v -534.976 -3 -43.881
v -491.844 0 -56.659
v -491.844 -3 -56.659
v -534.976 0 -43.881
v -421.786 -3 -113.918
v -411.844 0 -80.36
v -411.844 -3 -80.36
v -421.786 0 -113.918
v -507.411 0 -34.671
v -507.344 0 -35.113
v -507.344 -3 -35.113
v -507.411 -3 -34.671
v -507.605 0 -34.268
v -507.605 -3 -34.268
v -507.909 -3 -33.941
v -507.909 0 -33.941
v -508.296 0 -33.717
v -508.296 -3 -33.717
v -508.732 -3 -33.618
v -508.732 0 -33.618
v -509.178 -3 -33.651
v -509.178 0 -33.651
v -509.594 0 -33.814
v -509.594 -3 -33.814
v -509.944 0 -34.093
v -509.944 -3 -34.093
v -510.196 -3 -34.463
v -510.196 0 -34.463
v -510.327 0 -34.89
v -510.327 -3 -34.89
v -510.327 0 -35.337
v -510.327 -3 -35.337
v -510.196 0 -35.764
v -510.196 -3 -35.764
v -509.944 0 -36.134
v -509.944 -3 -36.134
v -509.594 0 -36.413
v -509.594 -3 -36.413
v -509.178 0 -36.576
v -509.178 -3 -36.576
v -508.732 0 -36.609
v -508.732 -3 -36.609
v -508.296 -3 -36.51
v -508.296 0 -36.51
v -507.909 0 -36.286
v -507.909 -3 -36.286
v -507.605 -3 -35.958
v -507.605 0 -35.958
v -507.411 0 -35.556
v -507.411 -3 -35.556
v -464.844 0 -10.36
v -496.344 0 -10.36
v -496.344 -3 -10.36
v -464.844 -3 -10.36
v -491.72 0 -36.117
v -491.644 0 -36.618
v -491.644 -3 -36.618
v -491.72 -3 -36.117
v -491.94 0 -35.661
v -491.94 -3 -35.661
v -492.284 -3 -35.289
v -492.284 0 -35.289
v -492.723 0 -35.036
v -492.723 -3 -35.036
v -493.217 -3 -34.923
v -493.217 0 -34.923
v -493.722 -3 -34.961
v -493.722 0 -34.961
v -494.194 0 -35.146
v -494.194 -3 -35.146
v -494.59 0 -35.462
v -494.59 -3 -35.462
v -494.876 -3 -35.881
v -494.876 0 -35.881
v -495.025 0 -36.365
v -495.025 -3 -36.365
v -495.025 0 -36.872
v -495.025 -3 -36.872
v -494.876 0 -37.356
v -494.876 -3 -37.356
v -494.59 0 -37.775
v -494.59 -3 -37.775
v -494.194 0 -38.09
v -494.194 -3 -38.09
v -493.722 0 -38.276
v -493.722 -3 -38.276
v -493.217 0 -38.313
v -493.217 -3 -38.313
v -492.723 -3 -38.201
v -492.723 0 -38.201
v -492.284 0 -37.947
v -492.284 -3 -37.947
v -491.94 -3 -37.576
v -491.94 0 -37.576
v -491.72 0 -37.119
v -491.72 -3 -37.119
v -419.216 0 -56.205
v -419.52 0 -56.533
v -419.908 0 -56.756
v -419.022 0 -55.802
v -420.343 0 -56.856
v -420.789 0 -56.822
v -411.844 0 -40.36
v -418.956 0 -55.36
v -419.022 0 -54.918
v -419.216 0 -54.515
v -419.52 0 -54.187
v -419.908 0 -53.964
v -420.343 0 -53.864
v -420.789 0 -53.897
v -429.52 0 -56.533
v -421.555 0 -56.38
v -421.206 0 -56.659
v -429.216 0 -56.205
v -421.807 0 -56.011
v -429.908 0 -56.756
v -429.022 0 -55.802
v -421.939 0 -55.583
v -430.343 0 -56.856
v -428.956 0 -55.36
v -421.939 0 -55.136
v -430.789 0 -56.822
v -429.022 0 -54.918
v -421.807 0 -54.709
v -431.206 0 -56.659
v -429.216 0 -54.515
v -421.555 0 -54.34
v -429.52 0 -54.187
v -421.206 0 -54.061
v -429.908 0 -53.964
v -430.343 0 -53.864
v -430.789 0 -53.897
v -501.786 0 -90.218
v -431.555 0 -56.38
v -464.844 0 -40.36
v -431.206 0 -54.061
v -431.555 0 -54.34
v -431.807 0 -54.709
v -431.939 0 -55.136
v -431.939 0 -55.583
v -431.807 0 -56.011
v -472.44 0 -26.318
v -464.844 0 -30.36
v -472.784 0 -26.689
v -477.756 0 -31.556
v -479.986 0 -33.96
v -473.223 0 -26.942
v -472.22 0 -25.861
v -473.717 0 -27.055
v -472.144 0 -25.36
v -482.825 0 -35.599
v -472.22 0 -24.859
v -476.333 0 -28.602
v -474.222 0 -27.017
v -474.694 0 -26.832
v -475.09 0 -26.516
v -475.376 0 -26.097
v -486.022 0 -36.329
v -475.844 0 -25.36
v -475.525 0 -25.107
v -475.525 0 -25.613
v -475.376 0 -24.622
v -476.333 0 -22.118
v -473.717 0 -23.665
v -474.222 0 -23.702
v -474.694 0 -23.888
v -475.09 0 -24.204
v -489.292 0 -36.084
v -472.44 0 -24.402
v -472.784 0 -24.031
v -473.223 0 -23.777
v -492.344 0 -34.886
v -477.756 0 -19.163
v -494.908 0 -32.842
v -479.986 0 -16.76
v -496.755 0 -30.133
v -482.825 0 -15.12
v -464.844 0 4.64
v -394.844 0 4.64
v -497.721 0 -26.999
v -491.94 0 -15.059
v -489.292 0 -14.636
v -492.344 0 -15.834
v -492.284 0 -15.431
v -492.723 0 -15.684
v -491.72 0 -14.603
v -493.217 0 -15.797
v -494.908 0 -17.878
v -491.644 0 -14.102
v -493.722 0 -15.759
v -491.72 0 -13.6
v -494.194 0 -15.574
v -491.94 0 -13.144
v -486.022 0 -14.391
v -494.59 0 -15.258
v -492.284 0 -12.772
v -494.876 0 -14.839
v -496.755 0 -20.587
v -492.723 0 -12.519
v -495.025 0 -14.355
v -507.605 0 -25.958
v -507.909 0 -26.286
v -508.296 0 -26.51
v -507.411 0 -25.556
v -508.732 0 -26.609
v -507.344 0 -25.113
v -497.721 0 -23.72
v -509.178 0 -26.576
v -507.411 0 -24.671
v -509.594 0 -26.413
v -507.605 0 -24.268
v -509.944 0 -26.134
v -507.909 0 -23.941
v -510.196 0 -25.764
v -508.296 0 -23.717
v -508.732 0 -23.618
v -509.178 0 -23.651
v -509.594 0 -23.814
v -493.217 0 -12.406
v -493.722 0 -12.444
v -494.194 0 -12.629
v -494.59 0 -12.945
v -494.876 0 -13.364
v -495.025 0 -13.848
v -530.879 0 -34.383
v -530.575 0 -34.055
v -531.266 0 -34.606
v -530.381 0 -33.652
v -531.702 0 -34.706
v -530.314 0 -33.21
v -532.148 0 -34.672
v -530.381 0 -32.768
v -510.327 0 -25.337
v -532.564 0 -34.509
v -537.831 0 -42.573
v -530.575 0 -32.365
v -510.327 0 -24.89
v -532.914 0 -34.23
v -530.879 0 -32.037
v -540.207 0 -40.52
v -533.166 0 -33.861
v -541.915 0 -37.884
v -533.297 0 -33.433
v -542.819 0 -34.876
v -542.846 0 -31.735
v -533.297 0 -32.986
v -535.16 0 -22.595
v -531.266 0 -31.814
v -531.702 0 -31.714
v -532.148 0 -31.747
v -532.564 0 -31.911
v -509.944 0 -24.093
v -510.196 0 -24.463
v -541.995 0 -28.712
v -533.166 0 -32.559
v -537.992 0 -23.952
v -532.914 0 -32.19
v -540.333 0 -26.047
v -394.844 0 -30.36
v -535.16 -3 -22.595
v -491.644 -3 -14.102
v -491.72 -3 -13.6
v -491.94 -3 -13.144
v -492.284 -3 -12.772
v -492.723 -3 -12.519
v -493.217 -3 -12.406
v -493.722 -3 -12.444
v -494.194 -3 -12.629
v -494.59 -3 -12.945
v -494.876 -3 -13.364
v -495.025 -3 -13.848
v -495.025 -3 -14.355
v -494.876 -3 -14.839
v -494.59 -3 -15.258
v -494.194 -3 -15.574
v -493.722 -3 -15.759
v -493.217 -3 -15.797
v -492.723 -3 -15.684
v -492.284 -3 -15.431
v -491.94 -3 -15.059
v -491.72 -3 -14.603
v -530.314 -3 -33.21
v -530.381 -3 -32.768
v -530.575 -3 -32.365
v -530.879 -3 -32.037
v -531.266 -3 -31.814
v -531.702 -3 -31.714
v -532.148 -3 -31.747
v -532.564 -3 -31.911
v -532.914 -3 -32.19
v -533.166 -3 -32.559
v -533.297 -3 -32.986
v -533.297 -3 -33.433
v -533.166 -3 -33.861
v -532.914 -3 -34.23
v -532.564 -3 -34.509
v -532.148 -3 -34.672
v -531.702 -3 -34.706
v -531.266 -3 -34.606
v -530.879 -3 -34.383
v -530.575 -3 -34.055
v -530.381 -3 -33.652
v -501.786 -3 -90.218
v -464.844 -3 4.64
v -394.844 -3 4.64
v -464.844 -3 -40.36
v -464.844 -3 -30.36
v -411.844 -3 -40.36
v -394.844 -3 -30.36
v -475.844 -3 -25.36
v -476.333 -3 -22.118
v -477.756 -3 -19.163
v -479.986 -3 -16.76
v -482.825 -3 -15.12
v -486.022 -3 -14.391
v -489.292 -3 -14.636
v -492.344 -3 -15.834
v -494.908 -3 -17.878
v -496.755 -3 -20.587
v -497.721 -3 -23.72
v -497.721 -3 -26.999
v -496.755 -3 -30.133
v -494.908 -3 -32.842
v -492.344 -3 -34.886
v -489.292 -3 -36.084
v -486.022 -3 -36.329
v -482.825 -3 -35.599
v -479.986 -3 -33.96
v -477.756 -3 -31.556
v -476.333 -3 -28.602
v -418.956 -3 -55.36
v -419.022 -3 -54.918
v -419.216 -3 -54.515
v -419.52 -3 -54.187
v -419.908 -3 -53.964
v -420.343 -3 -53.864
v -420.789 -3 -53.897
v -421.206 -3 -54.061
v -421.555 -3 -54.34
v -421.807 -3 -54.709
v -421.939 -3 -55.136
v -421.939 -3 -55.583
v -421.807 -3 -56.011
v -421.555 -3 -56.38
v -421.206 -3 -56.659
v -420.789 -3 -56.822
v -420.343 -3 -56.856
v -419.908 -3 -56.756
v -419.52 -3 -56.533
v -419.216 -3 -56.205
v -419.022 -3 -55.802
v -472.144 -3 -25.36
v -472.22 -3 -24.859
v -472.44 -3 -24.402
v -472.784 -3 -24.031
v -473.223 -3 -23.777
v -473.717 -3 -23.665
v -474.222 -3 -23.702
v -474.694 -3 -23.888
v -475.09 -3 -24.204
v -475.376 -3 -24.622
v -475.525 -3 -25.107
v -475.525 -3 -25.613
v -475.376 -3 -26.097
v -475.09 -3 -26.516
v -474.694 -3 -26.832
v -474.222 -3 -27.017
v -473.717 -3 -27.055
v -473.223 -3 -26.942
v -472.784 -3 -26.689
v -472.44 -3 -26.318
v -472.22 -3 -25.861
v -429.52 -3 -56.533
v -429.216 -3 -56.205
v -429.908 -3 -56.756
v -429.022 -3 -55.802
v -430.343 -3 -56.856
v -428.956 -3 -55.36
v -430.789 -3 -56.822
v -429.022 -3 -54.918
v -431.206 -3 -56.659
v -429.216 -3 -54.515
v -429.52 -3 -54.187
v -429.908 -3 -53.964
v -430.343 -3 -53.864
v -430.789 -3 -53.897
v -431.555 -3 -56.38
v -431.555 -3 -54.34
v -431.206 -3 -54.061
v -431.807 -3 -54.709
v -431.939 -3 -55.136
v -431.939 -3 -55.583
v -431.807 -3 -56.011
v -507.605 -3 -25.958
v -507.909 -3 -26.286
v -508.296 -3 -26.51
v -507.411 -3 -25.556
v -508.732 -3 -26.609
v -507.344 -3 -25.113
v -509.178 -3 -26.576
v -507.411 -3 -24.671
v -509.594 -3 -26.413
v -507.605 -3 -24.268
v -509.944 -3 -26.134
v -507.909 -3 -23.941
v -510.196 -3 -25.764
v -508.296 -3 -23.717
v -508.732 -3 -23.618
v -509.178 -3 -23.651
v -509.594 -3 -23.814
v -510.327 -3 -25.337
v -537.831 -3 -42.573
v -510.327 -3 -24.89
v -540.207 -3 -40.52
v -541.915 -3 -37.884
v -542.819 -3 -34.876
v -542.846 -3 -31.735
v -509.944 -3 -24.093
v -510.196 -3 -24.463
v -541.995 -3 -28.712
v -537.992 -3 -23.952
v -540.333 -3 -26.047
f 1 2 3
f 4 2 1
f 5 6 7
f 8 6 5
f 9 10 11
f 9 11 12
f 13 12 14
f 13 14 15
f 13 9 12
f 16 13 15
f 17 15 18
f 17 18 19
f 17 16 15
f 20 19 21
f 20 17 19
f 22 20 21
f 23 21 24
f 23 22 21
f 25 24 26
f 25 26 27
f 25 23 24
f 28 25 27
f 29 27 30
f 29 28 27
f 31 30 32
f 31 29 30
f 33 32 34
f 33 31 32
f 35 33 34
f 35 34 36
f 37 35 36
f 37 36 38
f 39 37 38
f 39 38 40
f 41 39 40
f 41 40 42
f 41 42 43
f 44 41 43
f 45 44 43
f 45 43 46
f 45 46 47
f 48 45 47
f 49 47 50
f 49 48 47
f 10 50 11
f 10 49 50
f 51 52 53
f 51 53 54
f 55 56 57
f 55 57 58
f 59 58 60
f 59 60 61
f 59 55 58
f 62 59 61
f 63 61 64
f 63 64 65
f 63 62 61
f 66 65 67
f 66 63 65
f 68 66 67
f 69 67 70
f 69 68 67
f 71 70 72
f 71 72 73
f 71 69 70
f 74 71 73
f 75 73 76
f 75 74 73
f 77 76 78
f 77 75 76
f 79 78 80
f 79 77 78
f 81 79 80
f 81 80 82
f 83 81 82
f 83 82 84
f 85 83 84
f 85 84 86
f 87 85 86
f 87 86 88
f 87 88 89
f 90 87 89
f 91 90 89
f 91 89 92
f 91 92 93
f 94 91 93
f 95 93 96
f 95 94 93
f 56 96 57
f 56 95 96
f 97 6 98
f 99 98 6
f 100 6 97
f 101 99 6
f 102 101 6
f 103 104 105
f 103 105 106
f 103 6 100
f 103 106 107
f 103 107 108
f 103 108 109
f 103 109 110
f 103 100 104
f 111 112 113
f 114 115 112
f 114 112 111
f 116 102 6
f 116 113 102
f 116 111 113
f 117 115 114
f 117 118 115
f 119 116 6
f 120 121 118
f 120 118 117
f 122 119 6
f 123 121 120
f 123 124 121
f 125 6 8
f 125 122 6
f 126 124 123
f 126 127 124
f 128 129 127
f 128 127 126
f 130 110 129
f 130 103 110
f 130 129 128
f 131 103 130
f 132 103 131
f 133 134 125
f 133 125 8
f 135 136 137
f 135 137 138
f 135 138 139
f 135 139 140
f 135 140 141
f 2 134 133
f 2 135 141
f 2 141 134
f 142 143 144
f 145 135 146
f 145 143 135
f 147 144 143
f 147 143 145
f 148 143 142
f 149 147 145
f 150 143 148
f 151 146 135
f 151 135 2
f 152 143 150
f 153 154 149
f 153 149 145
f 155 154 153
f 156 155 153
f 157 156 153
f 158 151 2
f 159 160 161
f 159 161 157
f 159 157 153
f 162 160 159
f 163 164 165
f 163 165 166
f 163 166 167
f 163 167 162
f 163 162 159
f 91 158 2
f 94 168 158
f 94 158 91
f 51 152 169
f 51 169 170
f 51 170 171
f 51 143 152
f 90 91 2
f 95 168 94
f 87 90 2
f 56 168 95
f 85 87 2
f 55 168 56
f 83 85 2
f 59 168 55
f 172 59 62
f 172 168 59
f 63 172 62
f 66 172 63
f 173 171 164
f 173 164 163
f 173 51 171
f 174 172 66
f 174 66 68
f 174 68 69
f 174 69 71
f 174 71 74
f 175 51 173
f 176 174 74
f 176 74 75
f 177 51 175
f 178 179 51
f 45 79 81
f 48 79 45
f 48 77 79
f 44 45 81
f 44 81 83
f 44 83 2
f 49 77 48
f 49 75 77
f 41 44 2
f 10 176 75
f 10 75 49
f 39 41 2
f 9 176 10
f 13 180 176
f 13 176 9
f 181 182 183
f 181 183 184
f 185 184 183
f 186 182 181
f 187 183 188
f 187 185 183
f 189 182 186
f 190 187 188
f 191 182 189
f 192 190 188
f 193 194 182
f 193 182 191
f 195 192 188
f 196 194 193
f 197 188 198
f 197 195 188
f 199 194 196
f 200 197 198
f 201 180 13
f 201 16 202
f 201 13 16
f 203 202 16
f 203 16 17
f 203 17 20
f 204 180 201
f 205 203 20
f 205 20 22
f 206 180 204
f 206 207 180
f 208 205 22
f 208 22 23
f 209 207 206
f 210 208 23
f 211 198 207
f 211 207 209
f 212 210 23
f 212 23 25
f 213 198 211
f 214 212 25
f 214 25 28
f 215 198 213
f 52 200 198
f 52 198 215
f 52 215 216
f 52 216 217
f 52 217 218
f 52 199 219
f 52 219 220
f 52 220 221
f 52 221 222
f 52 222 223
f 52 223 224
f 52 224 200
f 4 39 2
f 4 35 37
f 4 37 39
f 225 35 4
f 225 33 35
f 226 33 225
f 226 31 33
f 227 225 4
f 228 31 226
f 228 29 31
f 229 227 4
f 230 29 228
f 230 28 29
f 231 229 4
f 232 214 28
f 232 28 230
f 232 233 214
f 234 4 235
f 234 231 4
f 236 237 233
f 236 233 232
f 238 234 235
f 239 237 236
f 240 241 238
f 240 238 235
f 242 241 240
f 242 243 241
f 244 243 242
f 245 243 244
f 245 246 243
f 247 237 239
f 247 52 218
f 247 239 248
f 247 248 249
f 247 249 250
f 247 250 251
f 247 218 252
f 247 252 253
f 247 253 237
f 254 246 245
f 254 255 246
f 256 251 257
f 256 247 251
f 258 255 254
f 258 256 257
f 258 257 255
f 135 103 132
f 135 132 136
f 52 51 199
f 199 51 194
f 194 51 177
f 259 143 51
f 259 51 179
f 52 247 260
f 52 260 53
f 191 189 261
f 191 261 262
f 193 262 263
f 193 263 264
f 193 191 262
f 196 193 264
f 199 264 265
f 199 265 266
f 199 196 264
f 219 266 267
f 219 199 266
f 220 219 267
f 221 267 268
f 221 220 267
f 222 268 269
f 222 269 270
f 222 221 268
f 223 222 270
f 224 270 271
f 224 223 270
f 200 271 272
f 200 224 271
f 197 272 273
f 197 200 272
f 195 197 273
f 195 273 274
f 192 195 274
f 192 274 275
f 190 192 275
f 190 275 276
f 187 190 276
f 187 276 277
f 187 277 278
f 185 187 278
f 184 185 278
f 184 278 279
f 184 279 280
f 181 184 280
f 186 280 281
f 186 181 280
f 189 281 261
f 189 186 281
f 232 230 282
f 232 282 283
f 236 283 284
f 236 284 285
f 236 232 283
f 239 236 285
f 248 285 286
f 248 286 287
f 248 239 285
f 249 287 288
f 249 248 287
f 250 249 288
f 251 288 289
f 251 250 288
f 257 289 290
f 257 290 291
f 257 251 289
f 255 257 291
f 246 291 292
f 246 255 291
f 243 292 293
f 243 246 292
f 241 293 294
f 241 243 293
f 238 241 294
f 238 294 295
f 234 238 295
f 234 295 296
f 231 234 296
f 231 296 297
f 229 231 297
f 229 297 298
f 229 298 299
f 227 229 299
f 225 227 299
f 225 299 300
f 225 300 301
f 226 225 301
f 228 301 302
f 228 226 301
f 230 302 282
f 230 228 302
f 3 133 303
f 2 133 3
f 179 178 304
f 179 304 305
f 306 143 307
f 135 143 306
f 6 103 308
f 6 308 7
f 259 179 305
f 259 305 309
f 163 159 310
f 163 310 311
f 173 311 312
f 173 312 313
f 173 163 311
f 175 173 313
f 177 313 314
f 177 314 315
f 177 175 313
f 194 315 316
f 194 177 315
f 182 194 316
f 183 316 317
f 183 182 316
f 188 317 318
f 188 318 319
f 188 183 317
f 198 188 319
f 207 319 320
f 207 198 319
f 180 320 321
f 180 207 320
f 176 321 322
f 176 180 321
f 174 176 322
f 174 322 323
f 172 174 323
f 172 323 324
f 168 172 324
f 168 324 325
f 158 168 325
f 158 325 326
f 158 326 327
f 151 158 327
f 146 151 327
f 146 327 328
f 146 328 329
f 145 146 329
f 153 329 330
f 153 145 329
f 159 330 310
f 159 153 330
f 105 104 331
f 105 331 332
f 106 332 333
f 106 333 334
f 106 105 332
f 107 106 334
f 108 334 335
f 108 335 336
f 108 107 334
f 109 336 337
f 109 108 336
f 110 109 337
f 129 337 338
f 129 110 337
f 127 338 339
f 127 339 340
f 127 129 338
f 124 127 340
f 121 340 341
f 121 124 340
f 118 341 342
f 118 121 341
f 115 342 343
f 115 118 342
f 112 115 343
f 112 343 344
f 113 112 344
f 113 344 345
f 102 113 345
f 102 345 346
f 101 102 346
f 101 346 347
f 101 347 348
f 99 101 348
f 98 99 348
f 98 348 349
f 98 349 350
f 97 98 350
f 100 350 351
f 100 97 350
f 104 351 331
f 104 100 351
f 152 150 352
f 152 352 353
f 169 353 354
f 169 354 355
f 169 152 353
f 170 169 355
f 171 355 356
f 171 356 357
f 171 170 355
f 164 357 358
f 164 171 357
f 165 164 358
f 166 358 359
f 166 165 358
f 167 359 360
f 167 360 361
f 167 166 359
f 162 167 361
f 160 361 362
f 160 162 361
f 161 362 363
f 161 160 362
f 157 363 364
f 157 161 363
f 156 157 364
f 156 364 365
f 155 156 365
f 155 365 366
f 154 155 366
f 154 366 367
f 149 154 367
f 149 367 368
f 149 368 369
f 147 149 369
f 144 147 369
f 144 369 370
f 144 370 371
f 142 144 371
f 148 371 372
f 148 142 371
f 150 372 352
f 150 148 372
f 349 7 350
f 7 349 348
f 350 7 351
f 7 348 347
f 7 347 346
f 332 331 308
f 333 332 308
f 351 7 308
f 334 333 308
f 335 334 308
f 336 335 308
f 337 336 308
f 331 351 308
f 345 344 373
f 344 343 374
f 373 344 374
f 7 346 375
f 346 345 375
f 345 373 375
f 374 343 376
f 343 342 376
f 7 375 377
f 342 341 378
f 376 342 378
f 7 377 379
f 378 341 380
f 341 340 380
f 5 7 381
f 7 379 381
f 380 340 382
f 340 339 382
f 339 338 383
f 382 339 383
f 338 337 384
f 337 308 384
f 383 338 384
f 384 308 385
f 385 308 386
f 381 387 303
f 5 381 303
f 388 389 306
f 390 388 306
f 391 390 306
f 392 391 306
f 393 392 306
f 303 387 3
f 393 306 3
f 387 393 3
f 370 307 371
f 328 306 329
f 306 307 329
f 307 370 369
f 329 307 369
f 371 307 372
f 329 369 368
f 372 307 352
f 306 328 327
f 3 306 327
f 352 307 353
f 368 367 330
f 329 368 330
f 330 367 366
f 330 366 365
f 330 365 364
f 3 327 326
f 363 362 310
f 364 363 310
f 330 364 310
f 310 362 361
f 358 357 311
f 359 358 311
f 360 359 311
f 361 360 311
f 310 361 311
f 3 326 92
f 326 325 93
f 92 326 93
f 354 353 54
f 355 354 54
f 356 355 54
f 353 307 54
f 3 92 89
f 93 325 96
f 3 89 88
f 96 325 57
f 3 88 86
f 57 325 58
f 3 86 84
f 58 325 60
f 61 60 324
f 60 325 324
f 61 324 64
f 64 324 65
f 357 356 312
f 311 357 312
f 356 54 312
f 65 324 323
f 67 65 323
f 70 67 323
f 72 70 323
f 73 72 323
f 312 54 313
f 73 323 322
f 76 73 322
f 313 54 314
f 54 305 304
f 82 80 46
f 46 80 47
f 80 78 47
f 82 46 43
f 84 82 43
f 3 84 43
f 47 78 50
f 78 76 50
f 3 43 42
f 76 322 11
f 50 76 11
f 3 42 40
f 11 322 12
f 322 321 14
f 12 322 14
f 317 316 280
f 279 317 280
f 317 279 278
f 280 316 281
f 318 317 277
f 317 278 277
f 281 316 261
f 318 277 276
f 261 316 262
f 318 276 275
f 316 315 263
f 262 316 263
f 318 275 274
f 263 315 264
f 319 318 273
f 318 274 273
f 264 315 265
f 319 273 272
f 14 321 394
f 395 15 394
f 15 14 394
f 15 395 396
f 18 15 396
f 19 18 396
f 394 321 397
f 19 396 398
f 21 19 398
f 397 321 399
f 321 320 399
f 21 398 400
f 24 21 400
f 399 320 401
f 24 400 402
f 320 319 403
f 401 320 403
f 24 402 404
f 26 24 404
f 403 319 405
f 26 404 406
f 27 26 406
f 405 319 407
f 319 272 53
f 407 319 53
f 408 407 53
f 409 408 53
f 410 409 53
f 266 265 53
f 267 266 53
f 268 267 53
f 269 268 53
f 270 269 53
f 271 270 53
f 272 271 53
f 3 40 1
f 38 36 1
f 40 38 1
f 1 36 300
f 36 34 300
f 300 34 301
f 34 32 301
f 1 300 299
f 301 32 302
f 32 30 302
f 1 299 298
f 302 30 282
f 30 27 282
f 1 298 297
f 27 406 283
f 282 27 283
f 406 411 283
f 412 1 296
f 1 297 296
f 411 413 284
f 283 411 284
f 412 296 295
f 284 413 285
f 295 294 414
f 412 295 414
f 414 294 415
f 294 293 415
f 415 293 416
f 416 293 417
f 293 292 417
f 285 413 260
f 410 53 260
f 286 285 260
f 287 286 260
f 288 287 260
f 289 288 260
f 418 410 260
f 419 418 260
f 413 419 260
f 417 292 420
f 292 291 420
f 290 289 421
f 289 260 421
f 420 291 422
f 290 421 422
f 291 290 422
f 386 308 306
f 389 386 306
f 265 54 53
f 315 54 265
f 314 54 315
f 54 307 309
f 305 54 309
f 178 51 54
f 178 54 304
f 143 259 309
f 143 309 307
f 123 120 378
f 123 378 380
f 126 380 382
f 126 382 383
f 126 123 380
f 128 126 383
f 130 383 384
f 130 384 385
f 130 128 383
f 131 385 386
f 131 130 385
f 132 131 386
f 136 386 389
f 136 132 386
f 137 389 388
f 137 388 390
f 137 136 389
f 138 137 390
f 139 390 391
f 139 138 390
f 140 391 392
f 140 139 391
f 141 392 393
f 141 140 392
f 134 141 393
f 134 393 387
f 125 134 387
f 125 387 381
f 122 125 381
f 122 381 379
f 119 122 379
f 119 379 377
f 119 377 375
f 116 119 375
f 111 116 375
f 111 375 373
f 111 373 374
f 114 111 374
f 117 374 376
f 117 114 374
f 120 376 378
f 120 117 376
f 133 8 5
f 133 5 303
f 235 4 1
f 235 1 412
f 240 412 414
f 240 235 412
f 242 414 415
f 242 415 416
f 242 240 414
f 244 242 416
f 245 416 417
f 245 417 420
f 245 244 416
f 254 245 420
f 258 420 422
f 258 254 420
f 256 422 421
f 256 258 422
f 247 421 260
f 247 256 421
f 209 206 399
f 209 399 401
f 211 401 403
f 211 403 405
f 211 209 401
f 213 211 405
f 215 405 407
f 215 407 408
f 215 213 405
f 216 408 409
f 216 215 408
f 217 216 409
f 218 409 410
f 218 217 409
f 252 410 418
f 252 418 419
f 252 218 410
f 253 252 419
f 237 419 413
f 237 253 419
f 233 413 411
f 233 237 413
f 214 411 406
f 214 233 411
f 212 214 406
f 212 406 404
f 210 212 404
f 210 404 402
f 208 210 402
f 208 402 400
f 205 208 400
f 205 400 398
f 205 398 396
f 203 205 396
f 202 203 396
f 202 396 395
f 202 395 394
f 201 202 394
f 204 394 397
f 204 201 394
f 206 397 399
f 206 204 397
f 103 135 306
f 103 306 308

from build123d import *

# Parameters (mm, degrees)
ESQUISSE3_R        = 1.5
ESQUISSE3_R_2      = 11
ESQUISSE3_R_3      = 1.7
BOSS_EXTRU_3_DEPTH = 3


with BuildPart() as part:
    # Esquisse3 → Boss.-Extru.3 (new body)
    with BuildSketch(Plane.XZ):
        with BuildLine():
            Line((-464.844143116, -40.359876935), (-411.844143116, -40.359876935))
            Line((-411.844143116, -40.359876935), (-411.844143116, -80.359876935))
            Line((-411.844143116, -80.359876935), (-421.785994494, -113.91817831))
            Line((-421.785994494, -113.91817831), (-501.785994494, -90.217690572))
            Line((-501.785994494, -90.217690572), (-491.844143116, -56.659389197))
            Line((-491.844143116, -56.659389197), (-534.975651854, -43.881416773))
            ThreePointArc((-534.975651854, -43.881416773), (-542.943725497, -33.306292776), (-535.160059098, -22.594711075))
            Line((-535.160059098, -22.594711075), (-496.344143116, -10.359876935))
            Line((-496.344143116, -10.359876935), (-464.844143116, -10.359876935))
            Line((-464.844143116, -10.359876935), (-464.844143116, 4.640123065))
            Line((-464.844143116, 4.640123065), (-394.844143116, 4.640123065))
            Line((-394.844143116, 4.640123065), (-394.844143116, -30.359876935))
            Line((-394.844143116, -30.359876935), (-464.844143116, -30.359876935))
            Line((-464.844143116, -30.359876935), (-464.844143116, -40.359876935))
        make_face()
        with Locations((-531.814143116, -33.209876935)):
            Circle(ESQUISSE3_R, mode=Mode.SUBTRACT)
        with Locations((-508.844143116, -35.113476935)):
            Circle(ESQUISSE3_R, mode=Mode.SUBTRACT)
        with Locations((-508.844143116, -25.113476935)):
            Circle(ESQUISSE3_R, mode=Mode.SUBTRACT)
        with Locations((-486.844143116, -25.359876935)):
            Circle(ESQUISSE3_R_2, mode=Mode.SUBTRACT)
        with Locations((-473.844143116, -25.359876935)):
            Circle(ESQUISSE3_R_3, mode=Mode.SUBTRACT)
        with Locations((-493.344143116, -36.618207185)):
            Circle(ESQUISSE3_R_3, mode=Mode.SUBTRACT)
        with Locations((-493.344143116, -14.101546686)):
            Circle(ESQUISSE3_R_3, mode=Mode.SUBTRACT)
        with Locations((-420.455543116, -55.359876935)):
            Circle(ESQUISSE3_R, mode=Mode.SUBTRACT)
        with Locations((-430.455543116, -55.359876935)):
            Circle(ESQUISSE3_R, mode=Mode.SUBTRACT)
    extrude(amount=BOSS_EXTRU_3_DEPTH)


solid = part.part
